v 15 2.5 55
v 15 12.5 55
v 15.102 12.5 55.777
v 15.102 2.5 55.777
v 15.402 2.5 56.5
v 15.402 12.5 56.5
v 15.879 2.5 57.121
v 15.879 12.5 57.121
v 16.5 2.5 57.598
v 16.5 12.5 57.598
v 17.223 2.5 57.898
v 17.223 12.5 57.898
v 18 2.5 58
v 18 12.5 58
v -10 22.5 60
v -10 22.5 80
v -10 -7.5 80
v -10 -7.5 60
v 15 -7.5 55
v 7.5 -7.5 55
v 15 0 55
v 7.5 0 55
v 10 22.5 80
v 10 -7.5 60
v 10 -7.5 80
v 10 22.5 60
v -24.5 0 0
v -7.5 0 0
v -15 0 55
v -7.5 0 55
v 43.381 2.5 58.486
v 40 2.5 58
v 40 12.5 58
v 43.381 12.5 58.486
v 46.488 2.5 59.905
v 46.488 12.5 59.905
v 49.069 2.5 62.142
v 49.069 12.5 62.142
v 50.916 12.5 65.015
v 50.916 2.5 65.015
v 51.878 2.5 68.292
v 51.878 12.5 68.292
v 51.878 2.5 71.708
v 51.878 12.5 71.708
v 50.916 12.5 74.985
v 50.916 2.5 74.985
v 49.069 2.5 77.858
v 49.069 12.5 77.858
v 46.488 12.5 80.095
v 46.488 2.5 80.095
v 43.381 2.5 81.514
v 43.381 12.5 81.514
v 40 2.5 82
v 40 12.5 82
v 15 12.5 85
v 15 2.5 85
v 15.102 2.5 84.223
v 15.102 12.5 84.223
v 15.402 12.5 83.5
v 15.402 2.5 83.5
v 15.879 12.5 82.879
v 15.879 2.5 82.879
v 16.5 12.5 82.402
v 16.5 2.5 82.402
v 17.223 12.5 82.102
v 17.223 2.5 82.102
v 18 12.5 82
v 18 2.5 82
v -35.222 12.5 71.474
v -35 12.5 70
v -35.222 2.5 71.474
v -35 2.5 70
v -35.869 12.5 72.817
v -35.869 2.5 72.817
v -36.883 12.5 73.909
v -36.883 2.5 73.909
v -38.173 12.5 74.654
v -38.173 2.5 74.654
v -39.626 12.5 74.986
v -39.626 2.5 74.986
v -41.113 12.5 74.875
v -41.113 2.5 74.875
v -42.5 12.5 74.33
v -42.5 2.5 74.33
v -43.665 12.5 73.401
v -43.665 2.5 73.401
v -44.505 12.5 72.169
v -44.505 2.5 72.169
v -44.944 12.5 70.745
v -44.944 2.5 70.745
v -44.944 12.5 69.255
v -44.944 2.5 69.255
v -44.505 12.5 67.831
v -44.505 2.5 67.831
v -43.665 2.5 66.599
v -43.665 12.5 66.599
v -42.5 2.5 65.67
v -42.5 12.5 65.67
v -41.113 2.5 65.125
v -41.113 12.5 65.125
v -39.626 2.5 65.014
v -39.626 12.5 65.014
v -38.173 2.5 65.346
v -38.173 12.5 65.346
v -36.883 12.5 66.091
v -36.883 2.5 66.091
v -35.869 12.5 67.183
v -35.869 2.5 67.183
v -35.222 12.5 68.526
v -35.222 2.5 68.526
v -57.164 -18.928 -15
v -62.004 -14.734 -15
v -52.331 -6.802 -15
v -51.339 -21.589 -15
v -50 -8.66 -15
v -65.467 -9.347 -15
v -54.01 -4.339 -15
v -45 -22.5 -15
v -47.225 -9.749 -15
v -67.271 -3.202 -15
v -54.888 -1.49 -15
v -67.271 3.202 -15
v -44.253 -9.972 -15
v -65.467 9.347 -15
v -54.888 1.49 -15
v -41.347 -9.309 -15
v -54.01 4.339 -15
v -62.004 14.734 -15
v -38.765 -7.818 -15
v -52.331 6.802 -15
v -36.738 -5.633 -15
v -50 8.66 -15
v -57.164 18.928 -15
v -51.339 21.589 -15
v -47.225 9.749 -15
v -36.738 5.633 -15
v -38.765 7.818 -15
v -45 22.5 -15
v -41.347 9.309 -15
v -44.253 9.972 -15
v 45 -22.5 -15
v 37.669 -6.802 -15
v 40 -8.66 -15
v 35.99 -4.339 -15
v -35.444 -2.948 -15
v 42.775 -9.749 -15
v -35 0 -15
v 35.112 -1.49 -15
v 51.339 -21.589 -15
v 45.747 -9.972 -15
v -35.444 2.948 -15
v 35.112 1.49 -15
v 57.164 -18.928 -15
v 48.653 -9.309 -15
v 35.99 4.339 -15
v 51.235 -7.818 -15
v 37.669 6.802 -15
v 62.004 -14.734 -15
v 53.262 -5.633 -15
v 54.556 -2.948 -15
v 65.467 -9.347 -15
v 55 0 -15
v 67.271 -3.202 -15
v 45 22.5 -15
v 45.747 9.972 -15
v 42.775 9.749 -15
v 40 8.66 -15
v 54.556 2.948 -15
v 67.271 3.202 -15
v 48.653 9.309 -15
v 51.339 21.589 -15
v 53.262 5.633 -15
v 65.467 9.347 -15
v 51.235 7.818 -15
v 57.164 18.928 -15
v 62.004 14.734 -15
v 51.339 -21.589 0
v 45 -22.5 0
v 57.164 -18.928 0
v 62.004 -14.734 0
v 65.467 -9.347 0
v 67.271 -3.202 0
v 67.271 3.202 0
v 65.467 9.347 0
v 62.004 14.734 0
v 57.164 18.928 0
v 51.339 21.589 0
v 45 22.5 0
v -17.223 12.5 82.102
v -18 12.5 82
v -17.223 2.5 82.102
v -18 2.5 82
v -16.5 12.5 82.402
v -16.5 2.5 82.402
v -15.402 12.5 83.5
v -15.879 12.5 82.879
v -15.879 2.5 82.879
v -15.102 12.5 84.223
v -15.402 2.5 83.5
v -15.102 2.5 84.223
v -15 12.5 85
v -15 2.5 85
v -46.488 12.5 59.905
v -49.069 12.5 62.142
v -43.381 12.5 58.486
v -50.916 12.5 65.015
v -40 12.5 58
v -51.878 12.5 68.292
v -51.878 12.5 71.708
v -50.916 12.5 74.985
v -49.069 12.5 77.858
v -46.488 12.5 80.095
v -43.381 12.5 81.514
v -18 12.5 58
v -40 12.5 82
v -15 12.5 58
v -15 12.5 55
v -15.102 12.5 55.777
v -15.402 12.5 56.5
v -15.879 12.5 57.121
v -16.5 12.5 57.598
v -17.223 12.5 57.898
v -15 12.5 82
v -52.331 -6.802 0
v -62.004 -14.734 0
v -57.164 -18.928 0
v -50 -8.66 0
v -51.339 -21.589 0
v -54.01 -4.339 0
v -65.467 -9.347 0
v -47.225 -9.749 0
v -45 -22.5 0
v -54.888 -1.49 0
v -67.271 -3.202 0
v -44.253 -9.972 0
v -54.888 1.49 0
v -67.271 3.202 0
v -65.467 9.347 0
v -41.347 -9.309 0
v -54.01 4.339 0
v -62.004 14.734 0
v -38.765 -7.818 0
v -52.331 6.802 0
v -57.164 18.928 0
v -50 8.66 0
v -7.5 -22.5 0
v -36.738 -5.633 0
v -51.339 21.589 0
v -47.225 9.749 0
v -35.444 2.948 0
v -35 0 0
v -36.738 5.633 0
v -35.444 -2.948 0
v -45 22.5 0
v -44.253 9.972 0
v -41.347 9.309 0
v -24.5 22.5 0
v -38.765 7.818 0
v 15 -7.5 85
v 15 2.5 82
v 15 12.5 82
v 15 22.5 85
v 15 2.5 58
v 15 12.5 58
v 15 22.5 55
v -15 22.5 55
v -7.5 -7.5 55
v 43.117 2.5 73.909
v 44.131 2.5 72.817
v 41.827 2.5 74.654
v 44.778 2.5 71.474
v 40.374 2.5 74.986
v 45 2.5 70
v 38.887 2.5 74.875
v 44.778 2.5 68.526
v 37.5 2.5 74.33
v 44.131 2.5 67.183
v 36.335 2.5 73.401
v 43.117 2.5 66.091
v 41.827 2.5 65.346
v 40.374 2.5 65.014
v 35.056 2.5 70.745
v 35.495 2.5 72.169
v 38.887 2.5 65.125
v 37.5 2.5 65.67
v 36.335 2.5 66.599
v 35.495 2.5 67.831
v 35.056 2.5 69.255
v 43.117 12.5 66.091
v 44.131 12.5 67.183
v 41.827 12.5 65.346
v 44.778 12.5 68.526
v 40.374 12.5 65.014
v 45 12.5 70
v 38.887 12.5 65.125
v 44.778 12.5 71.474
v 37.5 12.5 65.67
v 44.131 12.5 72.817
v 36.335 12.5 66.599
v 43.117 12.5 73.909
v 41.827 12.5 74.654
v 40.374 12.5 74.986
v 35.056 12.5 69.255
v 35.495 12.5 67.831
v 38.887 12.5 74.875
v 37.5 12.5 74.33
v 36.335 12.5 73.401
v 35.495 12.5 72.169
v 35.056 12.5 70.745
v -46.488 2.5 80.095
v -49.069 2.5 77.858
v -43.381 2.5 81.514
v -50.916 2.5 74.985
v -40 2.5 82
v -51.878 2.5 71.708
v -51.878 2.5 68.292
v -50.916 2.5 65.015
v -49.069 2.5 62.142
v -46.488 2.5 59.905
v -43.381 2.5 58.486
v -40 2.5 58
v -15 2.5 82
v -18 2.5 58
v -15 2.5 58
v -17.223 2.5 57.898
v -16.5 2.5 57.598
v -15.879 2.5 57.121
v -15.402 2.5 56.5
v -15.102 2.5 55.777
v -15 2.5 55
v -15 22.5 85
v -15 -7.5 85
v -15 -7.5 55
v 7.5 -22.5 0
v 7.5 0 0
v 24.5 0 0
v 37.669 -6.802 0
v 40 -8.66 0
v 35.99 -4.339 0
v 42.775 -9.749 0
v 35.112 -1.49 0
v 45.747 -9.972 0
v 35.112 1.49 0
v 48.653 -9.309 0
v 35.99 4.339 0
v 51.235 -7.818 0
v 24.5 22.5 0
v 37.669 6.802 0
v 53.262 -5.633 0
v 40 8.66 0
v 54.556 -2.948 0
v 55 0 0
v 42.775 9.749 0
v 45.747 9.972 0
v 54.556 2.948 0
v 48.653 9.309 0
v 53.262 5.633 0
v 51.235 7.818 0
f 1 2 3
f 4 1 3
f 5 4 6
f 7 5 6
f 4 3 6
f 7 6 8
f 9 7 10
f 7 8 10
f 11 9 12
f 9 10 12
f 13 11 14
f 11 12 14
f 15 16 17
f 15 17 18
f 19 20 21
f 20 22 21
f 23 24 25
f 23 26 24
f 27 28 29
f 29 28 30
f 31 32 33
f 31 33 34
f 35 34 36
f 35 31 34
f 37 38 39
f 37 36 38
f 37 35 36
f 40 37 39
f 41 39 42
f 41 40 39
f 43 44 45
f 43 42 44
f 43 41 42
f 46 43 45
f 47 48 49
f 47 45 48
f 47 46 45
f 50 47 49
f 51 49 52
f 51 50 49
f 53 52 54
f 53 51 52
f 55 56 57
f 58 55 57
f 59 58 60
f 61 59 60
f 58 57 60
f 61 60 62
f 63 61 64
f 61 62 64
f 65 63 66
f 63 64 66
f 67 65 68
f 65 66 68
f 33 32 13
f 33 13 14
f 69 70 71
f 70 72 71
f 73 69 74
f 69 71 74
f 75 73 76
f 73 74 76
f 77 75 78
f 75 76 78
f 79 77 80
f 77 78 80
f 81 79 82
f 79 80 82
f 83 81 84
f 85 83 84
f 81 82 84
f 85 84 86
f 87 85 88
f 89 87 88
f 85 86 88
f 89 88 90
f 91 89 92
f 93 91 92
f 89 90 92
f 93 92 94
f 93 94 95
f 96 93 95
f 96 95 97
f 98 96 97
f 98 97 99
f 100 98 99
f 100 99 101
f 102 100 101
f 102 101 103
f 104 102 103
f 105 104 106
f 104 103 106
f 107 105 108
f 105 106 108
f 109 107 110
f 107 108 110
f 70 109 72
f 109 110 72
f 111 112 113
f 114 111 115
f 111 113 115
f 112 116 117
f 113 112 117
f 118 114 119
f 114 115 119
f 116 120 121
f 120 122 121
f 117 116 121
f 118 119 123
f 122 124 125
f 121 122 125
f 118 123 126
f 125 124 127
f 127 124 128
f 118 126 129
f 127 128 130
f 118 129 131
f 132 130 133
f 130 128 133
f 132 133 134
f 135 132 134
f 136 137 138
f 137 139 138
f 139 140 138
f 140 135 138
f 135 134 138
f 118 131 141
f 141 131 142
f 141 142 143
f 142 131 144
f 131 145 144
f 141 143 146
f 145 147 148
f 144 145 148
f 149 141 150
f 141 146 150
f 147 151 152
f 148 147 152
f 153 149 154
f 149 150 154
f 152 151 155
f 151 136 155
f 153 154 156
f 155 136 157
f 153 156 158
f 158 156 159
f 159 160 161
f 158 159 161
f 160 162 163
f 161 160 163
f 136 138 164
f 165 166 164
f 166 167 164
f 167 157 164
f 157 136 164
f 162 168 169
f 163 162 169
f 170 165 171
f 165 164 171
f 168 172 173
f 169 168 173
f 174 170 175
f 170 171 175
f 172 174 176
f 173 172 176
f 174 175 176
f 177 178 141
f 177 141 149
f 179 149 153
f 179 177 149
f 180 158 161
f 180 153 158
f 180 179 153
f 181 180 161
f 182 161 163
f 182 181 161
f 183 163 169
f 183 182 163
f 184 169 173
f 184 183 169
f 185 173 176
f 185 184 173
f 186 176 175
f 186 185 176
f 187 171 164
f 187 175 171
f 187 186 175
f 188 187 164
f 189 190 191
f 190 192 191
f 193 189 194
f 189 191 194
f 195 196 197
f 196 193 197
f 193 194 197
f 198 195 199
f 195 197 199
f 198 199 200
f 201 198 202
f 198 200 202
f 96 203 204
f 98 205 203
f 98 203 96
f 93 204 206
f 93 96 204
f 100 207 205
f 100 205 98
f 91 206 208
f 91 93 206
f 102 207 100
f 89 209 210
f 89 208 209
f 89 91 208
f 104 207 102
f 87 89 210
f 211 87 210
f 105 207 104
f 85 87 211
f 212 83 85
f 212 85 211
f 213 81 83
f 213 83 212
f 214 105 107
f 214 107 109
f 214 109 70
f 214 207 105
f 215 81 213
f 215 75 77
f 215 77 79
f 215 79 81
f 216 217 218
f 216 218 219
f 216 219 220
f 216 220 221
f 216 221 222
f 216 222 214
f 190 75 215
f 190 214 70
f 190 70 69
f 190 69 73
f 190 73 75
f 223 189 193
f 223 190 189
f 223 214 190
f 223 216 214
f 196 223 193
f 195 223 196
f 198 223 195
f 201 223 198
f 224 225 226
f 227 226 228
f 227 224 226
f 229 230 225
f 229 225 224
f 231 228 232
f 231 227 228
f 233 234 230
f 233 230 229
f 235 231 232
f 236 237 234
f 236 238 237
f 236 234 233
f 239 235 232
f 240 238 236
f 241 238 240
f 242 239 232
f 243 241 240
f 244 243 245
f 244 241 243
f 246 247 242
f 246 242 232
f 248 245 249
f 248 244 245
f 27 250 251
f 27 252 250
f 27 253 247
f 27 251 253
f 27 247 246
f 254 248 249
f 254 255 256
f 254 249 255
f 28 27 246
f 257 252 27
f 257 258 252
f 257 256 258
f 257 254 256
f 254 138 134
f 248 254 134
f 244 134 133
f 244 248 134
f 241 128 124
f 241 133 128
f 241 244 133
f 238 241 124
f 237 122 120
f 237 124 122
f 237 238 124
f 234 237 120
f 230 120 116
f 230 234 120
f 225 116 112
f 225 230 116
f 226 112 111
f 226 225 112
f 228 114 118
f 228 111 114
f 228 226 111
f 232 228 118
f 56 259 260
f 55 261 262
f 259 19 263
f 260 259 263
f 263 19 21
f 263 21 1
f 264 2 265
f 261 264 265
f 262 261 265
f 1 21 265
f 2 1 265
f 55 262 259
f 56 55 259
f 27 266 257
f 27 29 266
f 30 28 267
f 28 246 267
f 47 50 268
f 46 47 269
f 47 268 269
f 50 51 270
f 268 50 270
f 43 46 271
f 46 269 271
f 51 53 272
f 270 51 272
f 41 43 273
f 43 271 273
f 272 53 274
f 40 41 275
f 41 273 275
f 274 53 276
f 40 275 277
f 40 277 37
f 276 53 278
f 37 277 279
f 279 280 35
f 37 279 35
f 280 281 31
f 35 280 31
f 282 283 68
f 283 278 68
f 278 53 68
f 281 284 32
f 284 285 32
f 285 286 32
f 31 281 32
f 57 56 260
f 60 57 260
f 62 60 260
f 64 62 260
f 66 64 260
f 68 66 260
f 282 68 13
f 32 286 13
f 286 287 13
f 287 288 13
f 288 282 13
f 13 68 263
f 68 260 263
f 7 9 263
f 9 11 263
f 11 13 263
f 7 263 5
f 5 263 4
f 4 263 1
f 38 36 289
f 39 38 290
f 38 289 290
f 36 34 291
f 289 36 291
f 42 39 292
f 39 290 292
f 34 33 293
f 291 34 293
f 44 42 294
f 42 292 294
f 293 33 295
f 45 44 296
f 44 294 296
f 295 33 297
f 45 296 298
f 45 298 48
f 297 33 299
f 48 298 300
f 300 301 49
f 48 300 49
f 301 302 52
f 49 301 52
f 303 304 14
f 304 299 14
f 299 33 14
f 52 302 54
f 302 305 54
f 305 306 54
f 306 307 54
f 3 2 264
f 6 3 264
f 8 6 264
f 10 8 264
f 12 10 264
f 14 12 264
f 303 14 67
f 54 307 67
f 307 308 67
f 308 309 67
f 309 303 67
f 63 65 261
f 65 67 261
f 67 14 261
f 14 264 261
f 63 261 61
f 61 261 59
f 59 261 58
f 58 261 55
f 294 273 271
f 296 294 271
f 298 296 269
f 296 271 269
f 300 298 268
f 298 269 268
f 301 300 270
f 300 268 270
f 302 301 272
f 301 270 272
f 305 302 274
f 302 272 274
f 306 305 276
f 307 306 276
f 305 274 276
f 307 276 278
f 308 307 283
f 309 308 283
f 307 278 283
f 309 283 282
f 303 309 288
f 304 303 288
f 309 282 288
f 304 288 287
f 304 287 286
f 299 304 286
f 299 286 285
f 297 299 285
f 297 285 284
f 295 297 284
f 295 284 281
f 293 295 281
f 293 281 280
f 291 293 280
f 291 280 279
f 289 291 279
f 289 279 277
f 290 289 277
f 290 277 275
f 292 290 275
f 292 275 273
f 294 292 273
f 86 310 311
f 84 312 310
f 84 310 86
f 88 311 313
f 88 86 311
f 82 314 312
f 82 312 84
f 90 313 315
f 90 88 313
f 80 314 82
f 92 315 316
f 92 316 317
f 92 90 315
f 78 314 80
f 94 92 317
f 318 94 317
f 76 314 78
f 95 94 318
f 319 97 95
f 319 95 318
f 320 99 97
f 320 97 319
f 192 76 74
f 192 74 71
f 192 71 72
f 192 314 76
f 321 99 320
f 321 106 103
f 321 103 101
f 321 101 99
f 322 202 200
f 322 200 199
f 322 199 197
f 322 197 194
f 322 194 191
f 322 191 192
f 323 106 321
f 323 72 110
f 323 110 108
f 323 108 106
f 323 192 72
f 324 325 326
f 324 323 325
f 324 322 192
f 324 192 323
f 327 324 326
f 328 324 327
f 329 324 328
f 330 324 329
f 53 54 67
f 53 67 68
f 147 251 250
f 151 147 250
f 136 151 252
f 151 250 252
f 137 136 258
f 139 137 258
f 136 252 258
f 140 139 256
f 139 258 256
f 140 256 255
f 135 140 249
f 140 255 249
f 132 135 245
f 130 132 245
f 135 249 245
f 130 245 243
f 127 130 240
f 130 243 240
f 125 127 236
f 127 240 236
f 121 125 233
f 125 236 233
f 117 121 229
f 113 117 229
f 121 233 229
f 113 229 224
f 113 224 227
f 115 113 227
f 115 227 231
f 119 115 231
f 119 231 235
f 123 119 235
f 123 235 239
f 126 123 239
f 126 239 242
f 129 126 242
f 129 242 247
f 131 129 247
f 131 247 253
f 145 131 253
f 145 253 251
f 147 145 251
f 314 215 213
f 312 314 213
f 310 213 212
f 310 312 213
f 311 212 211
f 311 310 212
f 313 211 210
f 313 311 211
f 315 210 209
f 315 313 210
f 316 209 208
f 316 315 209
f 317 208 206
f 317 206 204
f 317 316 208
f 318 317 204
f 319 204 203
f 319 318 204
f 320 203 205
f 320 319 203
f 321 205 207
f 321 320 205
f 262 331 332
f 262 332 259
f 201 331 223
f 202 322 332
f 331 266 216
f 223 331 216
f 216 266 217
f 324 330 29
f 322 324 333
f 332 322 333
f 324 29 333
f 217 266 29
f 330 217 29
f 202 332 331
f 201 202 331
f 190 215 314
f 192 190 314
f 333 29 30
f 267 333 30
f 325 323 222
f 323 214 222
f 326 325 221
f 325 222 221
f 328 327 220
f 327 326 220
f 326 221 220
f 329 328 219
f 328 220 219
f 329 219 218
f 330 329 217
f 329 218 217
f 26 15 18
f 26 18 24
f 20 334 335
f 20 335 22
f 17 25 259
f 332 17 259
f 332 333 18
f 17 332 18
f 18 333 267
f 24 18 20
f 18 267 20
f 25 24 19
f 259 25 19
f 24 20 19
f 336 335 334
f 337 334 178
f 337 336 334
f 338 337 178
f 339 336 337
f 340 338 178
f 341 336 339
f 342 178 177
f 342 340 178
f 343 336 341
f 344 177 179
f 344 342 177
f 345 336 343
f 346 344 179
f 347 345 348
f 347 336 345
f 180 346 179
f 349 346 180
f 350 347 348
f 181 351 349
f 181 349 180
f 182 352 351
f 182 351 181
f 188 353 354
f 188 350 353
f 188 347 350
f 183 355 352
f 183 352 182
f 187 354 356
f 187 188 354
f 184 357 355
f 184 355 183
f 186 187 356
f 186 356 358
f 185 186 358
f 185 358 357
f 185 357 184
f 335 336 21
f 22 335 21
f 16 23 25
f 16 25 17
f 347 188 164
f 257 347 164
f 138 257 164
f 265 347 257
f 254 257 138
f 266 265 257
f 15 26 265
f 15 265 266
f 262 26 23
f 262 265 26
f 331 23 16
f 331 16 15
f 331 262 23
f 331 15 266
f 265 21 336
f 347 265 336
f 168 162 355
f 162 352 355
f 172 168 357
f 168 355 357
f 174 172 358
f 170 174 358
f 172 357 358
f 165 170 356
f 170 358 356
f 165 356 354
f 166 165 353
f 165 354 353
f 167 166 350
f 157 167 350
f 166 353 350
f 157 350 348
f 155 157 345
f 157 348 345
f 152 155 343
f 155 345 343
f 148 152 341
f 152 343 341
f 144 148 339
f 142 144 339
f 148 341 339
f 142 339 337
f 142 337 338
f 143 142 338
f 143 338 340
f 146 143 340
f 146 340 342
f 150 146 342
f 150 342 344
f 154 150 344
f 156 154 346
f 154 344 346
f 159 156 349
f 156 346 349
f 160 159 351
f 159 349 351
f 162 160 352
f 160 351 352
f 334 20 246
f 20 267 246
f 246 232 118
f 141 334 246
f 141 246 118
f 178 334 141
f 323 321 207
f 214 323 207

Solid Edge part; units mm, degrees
sketch "Sketch1" plane through (0, 0, 0) normal (0, 0, 1) x (1, 0, 0)
  line L0 (45, 22.5) -> (-45, 22.5)
  line L1 (-45, -22.5) -> (45, -22.5)
  arc A0 (-45, -22.5) -> (-45, 22.5) centre (-45, 0) cw
  arc A1 (45, 22.5) -> (45, -22.5) centre (45, 0) cw
  circle A2 centre (-45, 0) radius 10
  circle A3 centre (45, 0) radius 10
extrude "Protrusion1" add sketch "Sketch1" against normal blind 15
sketch "Sketch2" plane through (0, 0, 0) normal (1, 0, 0) x (0, 1, 0)
  line L0 (-7.5, 55) -> (-22.5, 0)
  line L1 (-22.5, 0) -> (0, 0)
  line L2 (0, 0) -> (0, 55)
  line L3 (0, 55) -> (-7.5, 55)
extrude "ExtrudedProtrusion_2" add sketch "Sketch2" along normal mid plane 15
sketch "Sketch3" plane through (0, 0, 0) normal (0, -1, 0) x (1, 0, 0)
  line L0 (15, 55) -> (24.5, 0)
  line L1 (0, 0) -> (24.5, 0)
  line L2 (0, 0) -> (-24.5, 0)
  line L3 (-15, 55) -> (-24.5, 0)
  line L4 (0, 55) -> (-15, 55)
  line L5 (0, 55) -> (15, 55)
extrude "ExtrudedProtrusion_3" add sketch "Sketch3" against normal blind 22.5
sketch "Sketch4" plane through (0, 7.5, 55) normal (0, 0, 1) x (0, 1, 0)
  line L0 (-15, 15) -> (-15, -15)
  line L1 (-15, -15) -> (15, -15)
  line L2 (15, -15) -> (15, 15)
  line L3 (15, 15) -> (-15, 15)
extrude "ExtrudedProtrusion_4" add sketch "Sketch4" along normal blind 30
sketch "Sketch5" plane through (0, -7.5, 70) normal (0, -1, 0) x (1, 0, 0)
  line L0 (10, -10) -> (10, 10)
  line L1 (10, 10) -> (-10, 10)
  line L2 (-10, 10) -> (-10, -10)
  line L3 (-10, -10) -> (10, -10)
extrude "ExtrudedCutout_1" cut sketch "Sketch5" along normal mid plane 100
sketch "Sketch6" plane through (15, 7.5, 70) normal (1, 0, 0) x (0, 1, 0)
  line L0 (5, -12) -> (5, 12)
  line L1 (5, 12) -> (-5, 12)
  line L2 (-5, 12) -> (-5, -12)
  line L3 (-5, -12) -> (5, -12)
extrude "ExtrudedProtrusion_5" add sketch "Sketch6" along normal blind 25
sketch "Sketch7" plane through (-15, 7.5, 70) normal (-1, 0, 0) x (0, 0, 1)
  line L0 (-12, 5) -> (12, 5)
  line L1 (12, 5) -> (12, -5)
  line L2 (12, -5) -> (-12, -5)
  line L3 (-12, -5) -> (-12, 5)
extrude "ExtrudedProtrusion_6" add sketch "Sketch7" along normal blind 25
sketch "Sketch8" plane through (27.5, 2.5, 70) normal (0, -1, 0) x (1, 0, 0)
  circle A0 centre (12.5, 0) radius 5
extrude "ExtrudedCutout_3" cut sketch "Sketch8" along normal mid plane 50
sketch "Sketch9" plane through (27.5, 2.5, 70) normal (0, -1, 0) x (1, 0, 0)
  circle A0 centre (12.5, 0) radius 12
  circle A1 centre (12.5, 0) radius 5
extrude "ExtrudedProtrusion_7" add sketch "Sketch9" against normal blind 10
sketch "Sketch10" plane through (-27.5, 2.5, 70) normal (0, -1, 0) x (1, 0, 0)
  circle A0 centre (-12.5, 0) radius 12
  circle A1 centre (-12.5, 0) radius 5
extrude "ExtrudedProtrusion_8" add sketch "Sketch10" against normal blind 10
sketch "Sketch11" plane through (-27.5, 2.5, 70) normal (0, -1, 0) x (1, 0, 0)
  circle A0 centre (-12.5, 0) radius 5
extrude "ExtrudedCutout_5" cut sketch "Sketch11" along normal mid plane 50
fillet "Round_2" radius 3 4 edges at (15, 7.5, 82) (-15, 7.5, 82) (15, 7.5, 58) (-15, 7.5, 58)
